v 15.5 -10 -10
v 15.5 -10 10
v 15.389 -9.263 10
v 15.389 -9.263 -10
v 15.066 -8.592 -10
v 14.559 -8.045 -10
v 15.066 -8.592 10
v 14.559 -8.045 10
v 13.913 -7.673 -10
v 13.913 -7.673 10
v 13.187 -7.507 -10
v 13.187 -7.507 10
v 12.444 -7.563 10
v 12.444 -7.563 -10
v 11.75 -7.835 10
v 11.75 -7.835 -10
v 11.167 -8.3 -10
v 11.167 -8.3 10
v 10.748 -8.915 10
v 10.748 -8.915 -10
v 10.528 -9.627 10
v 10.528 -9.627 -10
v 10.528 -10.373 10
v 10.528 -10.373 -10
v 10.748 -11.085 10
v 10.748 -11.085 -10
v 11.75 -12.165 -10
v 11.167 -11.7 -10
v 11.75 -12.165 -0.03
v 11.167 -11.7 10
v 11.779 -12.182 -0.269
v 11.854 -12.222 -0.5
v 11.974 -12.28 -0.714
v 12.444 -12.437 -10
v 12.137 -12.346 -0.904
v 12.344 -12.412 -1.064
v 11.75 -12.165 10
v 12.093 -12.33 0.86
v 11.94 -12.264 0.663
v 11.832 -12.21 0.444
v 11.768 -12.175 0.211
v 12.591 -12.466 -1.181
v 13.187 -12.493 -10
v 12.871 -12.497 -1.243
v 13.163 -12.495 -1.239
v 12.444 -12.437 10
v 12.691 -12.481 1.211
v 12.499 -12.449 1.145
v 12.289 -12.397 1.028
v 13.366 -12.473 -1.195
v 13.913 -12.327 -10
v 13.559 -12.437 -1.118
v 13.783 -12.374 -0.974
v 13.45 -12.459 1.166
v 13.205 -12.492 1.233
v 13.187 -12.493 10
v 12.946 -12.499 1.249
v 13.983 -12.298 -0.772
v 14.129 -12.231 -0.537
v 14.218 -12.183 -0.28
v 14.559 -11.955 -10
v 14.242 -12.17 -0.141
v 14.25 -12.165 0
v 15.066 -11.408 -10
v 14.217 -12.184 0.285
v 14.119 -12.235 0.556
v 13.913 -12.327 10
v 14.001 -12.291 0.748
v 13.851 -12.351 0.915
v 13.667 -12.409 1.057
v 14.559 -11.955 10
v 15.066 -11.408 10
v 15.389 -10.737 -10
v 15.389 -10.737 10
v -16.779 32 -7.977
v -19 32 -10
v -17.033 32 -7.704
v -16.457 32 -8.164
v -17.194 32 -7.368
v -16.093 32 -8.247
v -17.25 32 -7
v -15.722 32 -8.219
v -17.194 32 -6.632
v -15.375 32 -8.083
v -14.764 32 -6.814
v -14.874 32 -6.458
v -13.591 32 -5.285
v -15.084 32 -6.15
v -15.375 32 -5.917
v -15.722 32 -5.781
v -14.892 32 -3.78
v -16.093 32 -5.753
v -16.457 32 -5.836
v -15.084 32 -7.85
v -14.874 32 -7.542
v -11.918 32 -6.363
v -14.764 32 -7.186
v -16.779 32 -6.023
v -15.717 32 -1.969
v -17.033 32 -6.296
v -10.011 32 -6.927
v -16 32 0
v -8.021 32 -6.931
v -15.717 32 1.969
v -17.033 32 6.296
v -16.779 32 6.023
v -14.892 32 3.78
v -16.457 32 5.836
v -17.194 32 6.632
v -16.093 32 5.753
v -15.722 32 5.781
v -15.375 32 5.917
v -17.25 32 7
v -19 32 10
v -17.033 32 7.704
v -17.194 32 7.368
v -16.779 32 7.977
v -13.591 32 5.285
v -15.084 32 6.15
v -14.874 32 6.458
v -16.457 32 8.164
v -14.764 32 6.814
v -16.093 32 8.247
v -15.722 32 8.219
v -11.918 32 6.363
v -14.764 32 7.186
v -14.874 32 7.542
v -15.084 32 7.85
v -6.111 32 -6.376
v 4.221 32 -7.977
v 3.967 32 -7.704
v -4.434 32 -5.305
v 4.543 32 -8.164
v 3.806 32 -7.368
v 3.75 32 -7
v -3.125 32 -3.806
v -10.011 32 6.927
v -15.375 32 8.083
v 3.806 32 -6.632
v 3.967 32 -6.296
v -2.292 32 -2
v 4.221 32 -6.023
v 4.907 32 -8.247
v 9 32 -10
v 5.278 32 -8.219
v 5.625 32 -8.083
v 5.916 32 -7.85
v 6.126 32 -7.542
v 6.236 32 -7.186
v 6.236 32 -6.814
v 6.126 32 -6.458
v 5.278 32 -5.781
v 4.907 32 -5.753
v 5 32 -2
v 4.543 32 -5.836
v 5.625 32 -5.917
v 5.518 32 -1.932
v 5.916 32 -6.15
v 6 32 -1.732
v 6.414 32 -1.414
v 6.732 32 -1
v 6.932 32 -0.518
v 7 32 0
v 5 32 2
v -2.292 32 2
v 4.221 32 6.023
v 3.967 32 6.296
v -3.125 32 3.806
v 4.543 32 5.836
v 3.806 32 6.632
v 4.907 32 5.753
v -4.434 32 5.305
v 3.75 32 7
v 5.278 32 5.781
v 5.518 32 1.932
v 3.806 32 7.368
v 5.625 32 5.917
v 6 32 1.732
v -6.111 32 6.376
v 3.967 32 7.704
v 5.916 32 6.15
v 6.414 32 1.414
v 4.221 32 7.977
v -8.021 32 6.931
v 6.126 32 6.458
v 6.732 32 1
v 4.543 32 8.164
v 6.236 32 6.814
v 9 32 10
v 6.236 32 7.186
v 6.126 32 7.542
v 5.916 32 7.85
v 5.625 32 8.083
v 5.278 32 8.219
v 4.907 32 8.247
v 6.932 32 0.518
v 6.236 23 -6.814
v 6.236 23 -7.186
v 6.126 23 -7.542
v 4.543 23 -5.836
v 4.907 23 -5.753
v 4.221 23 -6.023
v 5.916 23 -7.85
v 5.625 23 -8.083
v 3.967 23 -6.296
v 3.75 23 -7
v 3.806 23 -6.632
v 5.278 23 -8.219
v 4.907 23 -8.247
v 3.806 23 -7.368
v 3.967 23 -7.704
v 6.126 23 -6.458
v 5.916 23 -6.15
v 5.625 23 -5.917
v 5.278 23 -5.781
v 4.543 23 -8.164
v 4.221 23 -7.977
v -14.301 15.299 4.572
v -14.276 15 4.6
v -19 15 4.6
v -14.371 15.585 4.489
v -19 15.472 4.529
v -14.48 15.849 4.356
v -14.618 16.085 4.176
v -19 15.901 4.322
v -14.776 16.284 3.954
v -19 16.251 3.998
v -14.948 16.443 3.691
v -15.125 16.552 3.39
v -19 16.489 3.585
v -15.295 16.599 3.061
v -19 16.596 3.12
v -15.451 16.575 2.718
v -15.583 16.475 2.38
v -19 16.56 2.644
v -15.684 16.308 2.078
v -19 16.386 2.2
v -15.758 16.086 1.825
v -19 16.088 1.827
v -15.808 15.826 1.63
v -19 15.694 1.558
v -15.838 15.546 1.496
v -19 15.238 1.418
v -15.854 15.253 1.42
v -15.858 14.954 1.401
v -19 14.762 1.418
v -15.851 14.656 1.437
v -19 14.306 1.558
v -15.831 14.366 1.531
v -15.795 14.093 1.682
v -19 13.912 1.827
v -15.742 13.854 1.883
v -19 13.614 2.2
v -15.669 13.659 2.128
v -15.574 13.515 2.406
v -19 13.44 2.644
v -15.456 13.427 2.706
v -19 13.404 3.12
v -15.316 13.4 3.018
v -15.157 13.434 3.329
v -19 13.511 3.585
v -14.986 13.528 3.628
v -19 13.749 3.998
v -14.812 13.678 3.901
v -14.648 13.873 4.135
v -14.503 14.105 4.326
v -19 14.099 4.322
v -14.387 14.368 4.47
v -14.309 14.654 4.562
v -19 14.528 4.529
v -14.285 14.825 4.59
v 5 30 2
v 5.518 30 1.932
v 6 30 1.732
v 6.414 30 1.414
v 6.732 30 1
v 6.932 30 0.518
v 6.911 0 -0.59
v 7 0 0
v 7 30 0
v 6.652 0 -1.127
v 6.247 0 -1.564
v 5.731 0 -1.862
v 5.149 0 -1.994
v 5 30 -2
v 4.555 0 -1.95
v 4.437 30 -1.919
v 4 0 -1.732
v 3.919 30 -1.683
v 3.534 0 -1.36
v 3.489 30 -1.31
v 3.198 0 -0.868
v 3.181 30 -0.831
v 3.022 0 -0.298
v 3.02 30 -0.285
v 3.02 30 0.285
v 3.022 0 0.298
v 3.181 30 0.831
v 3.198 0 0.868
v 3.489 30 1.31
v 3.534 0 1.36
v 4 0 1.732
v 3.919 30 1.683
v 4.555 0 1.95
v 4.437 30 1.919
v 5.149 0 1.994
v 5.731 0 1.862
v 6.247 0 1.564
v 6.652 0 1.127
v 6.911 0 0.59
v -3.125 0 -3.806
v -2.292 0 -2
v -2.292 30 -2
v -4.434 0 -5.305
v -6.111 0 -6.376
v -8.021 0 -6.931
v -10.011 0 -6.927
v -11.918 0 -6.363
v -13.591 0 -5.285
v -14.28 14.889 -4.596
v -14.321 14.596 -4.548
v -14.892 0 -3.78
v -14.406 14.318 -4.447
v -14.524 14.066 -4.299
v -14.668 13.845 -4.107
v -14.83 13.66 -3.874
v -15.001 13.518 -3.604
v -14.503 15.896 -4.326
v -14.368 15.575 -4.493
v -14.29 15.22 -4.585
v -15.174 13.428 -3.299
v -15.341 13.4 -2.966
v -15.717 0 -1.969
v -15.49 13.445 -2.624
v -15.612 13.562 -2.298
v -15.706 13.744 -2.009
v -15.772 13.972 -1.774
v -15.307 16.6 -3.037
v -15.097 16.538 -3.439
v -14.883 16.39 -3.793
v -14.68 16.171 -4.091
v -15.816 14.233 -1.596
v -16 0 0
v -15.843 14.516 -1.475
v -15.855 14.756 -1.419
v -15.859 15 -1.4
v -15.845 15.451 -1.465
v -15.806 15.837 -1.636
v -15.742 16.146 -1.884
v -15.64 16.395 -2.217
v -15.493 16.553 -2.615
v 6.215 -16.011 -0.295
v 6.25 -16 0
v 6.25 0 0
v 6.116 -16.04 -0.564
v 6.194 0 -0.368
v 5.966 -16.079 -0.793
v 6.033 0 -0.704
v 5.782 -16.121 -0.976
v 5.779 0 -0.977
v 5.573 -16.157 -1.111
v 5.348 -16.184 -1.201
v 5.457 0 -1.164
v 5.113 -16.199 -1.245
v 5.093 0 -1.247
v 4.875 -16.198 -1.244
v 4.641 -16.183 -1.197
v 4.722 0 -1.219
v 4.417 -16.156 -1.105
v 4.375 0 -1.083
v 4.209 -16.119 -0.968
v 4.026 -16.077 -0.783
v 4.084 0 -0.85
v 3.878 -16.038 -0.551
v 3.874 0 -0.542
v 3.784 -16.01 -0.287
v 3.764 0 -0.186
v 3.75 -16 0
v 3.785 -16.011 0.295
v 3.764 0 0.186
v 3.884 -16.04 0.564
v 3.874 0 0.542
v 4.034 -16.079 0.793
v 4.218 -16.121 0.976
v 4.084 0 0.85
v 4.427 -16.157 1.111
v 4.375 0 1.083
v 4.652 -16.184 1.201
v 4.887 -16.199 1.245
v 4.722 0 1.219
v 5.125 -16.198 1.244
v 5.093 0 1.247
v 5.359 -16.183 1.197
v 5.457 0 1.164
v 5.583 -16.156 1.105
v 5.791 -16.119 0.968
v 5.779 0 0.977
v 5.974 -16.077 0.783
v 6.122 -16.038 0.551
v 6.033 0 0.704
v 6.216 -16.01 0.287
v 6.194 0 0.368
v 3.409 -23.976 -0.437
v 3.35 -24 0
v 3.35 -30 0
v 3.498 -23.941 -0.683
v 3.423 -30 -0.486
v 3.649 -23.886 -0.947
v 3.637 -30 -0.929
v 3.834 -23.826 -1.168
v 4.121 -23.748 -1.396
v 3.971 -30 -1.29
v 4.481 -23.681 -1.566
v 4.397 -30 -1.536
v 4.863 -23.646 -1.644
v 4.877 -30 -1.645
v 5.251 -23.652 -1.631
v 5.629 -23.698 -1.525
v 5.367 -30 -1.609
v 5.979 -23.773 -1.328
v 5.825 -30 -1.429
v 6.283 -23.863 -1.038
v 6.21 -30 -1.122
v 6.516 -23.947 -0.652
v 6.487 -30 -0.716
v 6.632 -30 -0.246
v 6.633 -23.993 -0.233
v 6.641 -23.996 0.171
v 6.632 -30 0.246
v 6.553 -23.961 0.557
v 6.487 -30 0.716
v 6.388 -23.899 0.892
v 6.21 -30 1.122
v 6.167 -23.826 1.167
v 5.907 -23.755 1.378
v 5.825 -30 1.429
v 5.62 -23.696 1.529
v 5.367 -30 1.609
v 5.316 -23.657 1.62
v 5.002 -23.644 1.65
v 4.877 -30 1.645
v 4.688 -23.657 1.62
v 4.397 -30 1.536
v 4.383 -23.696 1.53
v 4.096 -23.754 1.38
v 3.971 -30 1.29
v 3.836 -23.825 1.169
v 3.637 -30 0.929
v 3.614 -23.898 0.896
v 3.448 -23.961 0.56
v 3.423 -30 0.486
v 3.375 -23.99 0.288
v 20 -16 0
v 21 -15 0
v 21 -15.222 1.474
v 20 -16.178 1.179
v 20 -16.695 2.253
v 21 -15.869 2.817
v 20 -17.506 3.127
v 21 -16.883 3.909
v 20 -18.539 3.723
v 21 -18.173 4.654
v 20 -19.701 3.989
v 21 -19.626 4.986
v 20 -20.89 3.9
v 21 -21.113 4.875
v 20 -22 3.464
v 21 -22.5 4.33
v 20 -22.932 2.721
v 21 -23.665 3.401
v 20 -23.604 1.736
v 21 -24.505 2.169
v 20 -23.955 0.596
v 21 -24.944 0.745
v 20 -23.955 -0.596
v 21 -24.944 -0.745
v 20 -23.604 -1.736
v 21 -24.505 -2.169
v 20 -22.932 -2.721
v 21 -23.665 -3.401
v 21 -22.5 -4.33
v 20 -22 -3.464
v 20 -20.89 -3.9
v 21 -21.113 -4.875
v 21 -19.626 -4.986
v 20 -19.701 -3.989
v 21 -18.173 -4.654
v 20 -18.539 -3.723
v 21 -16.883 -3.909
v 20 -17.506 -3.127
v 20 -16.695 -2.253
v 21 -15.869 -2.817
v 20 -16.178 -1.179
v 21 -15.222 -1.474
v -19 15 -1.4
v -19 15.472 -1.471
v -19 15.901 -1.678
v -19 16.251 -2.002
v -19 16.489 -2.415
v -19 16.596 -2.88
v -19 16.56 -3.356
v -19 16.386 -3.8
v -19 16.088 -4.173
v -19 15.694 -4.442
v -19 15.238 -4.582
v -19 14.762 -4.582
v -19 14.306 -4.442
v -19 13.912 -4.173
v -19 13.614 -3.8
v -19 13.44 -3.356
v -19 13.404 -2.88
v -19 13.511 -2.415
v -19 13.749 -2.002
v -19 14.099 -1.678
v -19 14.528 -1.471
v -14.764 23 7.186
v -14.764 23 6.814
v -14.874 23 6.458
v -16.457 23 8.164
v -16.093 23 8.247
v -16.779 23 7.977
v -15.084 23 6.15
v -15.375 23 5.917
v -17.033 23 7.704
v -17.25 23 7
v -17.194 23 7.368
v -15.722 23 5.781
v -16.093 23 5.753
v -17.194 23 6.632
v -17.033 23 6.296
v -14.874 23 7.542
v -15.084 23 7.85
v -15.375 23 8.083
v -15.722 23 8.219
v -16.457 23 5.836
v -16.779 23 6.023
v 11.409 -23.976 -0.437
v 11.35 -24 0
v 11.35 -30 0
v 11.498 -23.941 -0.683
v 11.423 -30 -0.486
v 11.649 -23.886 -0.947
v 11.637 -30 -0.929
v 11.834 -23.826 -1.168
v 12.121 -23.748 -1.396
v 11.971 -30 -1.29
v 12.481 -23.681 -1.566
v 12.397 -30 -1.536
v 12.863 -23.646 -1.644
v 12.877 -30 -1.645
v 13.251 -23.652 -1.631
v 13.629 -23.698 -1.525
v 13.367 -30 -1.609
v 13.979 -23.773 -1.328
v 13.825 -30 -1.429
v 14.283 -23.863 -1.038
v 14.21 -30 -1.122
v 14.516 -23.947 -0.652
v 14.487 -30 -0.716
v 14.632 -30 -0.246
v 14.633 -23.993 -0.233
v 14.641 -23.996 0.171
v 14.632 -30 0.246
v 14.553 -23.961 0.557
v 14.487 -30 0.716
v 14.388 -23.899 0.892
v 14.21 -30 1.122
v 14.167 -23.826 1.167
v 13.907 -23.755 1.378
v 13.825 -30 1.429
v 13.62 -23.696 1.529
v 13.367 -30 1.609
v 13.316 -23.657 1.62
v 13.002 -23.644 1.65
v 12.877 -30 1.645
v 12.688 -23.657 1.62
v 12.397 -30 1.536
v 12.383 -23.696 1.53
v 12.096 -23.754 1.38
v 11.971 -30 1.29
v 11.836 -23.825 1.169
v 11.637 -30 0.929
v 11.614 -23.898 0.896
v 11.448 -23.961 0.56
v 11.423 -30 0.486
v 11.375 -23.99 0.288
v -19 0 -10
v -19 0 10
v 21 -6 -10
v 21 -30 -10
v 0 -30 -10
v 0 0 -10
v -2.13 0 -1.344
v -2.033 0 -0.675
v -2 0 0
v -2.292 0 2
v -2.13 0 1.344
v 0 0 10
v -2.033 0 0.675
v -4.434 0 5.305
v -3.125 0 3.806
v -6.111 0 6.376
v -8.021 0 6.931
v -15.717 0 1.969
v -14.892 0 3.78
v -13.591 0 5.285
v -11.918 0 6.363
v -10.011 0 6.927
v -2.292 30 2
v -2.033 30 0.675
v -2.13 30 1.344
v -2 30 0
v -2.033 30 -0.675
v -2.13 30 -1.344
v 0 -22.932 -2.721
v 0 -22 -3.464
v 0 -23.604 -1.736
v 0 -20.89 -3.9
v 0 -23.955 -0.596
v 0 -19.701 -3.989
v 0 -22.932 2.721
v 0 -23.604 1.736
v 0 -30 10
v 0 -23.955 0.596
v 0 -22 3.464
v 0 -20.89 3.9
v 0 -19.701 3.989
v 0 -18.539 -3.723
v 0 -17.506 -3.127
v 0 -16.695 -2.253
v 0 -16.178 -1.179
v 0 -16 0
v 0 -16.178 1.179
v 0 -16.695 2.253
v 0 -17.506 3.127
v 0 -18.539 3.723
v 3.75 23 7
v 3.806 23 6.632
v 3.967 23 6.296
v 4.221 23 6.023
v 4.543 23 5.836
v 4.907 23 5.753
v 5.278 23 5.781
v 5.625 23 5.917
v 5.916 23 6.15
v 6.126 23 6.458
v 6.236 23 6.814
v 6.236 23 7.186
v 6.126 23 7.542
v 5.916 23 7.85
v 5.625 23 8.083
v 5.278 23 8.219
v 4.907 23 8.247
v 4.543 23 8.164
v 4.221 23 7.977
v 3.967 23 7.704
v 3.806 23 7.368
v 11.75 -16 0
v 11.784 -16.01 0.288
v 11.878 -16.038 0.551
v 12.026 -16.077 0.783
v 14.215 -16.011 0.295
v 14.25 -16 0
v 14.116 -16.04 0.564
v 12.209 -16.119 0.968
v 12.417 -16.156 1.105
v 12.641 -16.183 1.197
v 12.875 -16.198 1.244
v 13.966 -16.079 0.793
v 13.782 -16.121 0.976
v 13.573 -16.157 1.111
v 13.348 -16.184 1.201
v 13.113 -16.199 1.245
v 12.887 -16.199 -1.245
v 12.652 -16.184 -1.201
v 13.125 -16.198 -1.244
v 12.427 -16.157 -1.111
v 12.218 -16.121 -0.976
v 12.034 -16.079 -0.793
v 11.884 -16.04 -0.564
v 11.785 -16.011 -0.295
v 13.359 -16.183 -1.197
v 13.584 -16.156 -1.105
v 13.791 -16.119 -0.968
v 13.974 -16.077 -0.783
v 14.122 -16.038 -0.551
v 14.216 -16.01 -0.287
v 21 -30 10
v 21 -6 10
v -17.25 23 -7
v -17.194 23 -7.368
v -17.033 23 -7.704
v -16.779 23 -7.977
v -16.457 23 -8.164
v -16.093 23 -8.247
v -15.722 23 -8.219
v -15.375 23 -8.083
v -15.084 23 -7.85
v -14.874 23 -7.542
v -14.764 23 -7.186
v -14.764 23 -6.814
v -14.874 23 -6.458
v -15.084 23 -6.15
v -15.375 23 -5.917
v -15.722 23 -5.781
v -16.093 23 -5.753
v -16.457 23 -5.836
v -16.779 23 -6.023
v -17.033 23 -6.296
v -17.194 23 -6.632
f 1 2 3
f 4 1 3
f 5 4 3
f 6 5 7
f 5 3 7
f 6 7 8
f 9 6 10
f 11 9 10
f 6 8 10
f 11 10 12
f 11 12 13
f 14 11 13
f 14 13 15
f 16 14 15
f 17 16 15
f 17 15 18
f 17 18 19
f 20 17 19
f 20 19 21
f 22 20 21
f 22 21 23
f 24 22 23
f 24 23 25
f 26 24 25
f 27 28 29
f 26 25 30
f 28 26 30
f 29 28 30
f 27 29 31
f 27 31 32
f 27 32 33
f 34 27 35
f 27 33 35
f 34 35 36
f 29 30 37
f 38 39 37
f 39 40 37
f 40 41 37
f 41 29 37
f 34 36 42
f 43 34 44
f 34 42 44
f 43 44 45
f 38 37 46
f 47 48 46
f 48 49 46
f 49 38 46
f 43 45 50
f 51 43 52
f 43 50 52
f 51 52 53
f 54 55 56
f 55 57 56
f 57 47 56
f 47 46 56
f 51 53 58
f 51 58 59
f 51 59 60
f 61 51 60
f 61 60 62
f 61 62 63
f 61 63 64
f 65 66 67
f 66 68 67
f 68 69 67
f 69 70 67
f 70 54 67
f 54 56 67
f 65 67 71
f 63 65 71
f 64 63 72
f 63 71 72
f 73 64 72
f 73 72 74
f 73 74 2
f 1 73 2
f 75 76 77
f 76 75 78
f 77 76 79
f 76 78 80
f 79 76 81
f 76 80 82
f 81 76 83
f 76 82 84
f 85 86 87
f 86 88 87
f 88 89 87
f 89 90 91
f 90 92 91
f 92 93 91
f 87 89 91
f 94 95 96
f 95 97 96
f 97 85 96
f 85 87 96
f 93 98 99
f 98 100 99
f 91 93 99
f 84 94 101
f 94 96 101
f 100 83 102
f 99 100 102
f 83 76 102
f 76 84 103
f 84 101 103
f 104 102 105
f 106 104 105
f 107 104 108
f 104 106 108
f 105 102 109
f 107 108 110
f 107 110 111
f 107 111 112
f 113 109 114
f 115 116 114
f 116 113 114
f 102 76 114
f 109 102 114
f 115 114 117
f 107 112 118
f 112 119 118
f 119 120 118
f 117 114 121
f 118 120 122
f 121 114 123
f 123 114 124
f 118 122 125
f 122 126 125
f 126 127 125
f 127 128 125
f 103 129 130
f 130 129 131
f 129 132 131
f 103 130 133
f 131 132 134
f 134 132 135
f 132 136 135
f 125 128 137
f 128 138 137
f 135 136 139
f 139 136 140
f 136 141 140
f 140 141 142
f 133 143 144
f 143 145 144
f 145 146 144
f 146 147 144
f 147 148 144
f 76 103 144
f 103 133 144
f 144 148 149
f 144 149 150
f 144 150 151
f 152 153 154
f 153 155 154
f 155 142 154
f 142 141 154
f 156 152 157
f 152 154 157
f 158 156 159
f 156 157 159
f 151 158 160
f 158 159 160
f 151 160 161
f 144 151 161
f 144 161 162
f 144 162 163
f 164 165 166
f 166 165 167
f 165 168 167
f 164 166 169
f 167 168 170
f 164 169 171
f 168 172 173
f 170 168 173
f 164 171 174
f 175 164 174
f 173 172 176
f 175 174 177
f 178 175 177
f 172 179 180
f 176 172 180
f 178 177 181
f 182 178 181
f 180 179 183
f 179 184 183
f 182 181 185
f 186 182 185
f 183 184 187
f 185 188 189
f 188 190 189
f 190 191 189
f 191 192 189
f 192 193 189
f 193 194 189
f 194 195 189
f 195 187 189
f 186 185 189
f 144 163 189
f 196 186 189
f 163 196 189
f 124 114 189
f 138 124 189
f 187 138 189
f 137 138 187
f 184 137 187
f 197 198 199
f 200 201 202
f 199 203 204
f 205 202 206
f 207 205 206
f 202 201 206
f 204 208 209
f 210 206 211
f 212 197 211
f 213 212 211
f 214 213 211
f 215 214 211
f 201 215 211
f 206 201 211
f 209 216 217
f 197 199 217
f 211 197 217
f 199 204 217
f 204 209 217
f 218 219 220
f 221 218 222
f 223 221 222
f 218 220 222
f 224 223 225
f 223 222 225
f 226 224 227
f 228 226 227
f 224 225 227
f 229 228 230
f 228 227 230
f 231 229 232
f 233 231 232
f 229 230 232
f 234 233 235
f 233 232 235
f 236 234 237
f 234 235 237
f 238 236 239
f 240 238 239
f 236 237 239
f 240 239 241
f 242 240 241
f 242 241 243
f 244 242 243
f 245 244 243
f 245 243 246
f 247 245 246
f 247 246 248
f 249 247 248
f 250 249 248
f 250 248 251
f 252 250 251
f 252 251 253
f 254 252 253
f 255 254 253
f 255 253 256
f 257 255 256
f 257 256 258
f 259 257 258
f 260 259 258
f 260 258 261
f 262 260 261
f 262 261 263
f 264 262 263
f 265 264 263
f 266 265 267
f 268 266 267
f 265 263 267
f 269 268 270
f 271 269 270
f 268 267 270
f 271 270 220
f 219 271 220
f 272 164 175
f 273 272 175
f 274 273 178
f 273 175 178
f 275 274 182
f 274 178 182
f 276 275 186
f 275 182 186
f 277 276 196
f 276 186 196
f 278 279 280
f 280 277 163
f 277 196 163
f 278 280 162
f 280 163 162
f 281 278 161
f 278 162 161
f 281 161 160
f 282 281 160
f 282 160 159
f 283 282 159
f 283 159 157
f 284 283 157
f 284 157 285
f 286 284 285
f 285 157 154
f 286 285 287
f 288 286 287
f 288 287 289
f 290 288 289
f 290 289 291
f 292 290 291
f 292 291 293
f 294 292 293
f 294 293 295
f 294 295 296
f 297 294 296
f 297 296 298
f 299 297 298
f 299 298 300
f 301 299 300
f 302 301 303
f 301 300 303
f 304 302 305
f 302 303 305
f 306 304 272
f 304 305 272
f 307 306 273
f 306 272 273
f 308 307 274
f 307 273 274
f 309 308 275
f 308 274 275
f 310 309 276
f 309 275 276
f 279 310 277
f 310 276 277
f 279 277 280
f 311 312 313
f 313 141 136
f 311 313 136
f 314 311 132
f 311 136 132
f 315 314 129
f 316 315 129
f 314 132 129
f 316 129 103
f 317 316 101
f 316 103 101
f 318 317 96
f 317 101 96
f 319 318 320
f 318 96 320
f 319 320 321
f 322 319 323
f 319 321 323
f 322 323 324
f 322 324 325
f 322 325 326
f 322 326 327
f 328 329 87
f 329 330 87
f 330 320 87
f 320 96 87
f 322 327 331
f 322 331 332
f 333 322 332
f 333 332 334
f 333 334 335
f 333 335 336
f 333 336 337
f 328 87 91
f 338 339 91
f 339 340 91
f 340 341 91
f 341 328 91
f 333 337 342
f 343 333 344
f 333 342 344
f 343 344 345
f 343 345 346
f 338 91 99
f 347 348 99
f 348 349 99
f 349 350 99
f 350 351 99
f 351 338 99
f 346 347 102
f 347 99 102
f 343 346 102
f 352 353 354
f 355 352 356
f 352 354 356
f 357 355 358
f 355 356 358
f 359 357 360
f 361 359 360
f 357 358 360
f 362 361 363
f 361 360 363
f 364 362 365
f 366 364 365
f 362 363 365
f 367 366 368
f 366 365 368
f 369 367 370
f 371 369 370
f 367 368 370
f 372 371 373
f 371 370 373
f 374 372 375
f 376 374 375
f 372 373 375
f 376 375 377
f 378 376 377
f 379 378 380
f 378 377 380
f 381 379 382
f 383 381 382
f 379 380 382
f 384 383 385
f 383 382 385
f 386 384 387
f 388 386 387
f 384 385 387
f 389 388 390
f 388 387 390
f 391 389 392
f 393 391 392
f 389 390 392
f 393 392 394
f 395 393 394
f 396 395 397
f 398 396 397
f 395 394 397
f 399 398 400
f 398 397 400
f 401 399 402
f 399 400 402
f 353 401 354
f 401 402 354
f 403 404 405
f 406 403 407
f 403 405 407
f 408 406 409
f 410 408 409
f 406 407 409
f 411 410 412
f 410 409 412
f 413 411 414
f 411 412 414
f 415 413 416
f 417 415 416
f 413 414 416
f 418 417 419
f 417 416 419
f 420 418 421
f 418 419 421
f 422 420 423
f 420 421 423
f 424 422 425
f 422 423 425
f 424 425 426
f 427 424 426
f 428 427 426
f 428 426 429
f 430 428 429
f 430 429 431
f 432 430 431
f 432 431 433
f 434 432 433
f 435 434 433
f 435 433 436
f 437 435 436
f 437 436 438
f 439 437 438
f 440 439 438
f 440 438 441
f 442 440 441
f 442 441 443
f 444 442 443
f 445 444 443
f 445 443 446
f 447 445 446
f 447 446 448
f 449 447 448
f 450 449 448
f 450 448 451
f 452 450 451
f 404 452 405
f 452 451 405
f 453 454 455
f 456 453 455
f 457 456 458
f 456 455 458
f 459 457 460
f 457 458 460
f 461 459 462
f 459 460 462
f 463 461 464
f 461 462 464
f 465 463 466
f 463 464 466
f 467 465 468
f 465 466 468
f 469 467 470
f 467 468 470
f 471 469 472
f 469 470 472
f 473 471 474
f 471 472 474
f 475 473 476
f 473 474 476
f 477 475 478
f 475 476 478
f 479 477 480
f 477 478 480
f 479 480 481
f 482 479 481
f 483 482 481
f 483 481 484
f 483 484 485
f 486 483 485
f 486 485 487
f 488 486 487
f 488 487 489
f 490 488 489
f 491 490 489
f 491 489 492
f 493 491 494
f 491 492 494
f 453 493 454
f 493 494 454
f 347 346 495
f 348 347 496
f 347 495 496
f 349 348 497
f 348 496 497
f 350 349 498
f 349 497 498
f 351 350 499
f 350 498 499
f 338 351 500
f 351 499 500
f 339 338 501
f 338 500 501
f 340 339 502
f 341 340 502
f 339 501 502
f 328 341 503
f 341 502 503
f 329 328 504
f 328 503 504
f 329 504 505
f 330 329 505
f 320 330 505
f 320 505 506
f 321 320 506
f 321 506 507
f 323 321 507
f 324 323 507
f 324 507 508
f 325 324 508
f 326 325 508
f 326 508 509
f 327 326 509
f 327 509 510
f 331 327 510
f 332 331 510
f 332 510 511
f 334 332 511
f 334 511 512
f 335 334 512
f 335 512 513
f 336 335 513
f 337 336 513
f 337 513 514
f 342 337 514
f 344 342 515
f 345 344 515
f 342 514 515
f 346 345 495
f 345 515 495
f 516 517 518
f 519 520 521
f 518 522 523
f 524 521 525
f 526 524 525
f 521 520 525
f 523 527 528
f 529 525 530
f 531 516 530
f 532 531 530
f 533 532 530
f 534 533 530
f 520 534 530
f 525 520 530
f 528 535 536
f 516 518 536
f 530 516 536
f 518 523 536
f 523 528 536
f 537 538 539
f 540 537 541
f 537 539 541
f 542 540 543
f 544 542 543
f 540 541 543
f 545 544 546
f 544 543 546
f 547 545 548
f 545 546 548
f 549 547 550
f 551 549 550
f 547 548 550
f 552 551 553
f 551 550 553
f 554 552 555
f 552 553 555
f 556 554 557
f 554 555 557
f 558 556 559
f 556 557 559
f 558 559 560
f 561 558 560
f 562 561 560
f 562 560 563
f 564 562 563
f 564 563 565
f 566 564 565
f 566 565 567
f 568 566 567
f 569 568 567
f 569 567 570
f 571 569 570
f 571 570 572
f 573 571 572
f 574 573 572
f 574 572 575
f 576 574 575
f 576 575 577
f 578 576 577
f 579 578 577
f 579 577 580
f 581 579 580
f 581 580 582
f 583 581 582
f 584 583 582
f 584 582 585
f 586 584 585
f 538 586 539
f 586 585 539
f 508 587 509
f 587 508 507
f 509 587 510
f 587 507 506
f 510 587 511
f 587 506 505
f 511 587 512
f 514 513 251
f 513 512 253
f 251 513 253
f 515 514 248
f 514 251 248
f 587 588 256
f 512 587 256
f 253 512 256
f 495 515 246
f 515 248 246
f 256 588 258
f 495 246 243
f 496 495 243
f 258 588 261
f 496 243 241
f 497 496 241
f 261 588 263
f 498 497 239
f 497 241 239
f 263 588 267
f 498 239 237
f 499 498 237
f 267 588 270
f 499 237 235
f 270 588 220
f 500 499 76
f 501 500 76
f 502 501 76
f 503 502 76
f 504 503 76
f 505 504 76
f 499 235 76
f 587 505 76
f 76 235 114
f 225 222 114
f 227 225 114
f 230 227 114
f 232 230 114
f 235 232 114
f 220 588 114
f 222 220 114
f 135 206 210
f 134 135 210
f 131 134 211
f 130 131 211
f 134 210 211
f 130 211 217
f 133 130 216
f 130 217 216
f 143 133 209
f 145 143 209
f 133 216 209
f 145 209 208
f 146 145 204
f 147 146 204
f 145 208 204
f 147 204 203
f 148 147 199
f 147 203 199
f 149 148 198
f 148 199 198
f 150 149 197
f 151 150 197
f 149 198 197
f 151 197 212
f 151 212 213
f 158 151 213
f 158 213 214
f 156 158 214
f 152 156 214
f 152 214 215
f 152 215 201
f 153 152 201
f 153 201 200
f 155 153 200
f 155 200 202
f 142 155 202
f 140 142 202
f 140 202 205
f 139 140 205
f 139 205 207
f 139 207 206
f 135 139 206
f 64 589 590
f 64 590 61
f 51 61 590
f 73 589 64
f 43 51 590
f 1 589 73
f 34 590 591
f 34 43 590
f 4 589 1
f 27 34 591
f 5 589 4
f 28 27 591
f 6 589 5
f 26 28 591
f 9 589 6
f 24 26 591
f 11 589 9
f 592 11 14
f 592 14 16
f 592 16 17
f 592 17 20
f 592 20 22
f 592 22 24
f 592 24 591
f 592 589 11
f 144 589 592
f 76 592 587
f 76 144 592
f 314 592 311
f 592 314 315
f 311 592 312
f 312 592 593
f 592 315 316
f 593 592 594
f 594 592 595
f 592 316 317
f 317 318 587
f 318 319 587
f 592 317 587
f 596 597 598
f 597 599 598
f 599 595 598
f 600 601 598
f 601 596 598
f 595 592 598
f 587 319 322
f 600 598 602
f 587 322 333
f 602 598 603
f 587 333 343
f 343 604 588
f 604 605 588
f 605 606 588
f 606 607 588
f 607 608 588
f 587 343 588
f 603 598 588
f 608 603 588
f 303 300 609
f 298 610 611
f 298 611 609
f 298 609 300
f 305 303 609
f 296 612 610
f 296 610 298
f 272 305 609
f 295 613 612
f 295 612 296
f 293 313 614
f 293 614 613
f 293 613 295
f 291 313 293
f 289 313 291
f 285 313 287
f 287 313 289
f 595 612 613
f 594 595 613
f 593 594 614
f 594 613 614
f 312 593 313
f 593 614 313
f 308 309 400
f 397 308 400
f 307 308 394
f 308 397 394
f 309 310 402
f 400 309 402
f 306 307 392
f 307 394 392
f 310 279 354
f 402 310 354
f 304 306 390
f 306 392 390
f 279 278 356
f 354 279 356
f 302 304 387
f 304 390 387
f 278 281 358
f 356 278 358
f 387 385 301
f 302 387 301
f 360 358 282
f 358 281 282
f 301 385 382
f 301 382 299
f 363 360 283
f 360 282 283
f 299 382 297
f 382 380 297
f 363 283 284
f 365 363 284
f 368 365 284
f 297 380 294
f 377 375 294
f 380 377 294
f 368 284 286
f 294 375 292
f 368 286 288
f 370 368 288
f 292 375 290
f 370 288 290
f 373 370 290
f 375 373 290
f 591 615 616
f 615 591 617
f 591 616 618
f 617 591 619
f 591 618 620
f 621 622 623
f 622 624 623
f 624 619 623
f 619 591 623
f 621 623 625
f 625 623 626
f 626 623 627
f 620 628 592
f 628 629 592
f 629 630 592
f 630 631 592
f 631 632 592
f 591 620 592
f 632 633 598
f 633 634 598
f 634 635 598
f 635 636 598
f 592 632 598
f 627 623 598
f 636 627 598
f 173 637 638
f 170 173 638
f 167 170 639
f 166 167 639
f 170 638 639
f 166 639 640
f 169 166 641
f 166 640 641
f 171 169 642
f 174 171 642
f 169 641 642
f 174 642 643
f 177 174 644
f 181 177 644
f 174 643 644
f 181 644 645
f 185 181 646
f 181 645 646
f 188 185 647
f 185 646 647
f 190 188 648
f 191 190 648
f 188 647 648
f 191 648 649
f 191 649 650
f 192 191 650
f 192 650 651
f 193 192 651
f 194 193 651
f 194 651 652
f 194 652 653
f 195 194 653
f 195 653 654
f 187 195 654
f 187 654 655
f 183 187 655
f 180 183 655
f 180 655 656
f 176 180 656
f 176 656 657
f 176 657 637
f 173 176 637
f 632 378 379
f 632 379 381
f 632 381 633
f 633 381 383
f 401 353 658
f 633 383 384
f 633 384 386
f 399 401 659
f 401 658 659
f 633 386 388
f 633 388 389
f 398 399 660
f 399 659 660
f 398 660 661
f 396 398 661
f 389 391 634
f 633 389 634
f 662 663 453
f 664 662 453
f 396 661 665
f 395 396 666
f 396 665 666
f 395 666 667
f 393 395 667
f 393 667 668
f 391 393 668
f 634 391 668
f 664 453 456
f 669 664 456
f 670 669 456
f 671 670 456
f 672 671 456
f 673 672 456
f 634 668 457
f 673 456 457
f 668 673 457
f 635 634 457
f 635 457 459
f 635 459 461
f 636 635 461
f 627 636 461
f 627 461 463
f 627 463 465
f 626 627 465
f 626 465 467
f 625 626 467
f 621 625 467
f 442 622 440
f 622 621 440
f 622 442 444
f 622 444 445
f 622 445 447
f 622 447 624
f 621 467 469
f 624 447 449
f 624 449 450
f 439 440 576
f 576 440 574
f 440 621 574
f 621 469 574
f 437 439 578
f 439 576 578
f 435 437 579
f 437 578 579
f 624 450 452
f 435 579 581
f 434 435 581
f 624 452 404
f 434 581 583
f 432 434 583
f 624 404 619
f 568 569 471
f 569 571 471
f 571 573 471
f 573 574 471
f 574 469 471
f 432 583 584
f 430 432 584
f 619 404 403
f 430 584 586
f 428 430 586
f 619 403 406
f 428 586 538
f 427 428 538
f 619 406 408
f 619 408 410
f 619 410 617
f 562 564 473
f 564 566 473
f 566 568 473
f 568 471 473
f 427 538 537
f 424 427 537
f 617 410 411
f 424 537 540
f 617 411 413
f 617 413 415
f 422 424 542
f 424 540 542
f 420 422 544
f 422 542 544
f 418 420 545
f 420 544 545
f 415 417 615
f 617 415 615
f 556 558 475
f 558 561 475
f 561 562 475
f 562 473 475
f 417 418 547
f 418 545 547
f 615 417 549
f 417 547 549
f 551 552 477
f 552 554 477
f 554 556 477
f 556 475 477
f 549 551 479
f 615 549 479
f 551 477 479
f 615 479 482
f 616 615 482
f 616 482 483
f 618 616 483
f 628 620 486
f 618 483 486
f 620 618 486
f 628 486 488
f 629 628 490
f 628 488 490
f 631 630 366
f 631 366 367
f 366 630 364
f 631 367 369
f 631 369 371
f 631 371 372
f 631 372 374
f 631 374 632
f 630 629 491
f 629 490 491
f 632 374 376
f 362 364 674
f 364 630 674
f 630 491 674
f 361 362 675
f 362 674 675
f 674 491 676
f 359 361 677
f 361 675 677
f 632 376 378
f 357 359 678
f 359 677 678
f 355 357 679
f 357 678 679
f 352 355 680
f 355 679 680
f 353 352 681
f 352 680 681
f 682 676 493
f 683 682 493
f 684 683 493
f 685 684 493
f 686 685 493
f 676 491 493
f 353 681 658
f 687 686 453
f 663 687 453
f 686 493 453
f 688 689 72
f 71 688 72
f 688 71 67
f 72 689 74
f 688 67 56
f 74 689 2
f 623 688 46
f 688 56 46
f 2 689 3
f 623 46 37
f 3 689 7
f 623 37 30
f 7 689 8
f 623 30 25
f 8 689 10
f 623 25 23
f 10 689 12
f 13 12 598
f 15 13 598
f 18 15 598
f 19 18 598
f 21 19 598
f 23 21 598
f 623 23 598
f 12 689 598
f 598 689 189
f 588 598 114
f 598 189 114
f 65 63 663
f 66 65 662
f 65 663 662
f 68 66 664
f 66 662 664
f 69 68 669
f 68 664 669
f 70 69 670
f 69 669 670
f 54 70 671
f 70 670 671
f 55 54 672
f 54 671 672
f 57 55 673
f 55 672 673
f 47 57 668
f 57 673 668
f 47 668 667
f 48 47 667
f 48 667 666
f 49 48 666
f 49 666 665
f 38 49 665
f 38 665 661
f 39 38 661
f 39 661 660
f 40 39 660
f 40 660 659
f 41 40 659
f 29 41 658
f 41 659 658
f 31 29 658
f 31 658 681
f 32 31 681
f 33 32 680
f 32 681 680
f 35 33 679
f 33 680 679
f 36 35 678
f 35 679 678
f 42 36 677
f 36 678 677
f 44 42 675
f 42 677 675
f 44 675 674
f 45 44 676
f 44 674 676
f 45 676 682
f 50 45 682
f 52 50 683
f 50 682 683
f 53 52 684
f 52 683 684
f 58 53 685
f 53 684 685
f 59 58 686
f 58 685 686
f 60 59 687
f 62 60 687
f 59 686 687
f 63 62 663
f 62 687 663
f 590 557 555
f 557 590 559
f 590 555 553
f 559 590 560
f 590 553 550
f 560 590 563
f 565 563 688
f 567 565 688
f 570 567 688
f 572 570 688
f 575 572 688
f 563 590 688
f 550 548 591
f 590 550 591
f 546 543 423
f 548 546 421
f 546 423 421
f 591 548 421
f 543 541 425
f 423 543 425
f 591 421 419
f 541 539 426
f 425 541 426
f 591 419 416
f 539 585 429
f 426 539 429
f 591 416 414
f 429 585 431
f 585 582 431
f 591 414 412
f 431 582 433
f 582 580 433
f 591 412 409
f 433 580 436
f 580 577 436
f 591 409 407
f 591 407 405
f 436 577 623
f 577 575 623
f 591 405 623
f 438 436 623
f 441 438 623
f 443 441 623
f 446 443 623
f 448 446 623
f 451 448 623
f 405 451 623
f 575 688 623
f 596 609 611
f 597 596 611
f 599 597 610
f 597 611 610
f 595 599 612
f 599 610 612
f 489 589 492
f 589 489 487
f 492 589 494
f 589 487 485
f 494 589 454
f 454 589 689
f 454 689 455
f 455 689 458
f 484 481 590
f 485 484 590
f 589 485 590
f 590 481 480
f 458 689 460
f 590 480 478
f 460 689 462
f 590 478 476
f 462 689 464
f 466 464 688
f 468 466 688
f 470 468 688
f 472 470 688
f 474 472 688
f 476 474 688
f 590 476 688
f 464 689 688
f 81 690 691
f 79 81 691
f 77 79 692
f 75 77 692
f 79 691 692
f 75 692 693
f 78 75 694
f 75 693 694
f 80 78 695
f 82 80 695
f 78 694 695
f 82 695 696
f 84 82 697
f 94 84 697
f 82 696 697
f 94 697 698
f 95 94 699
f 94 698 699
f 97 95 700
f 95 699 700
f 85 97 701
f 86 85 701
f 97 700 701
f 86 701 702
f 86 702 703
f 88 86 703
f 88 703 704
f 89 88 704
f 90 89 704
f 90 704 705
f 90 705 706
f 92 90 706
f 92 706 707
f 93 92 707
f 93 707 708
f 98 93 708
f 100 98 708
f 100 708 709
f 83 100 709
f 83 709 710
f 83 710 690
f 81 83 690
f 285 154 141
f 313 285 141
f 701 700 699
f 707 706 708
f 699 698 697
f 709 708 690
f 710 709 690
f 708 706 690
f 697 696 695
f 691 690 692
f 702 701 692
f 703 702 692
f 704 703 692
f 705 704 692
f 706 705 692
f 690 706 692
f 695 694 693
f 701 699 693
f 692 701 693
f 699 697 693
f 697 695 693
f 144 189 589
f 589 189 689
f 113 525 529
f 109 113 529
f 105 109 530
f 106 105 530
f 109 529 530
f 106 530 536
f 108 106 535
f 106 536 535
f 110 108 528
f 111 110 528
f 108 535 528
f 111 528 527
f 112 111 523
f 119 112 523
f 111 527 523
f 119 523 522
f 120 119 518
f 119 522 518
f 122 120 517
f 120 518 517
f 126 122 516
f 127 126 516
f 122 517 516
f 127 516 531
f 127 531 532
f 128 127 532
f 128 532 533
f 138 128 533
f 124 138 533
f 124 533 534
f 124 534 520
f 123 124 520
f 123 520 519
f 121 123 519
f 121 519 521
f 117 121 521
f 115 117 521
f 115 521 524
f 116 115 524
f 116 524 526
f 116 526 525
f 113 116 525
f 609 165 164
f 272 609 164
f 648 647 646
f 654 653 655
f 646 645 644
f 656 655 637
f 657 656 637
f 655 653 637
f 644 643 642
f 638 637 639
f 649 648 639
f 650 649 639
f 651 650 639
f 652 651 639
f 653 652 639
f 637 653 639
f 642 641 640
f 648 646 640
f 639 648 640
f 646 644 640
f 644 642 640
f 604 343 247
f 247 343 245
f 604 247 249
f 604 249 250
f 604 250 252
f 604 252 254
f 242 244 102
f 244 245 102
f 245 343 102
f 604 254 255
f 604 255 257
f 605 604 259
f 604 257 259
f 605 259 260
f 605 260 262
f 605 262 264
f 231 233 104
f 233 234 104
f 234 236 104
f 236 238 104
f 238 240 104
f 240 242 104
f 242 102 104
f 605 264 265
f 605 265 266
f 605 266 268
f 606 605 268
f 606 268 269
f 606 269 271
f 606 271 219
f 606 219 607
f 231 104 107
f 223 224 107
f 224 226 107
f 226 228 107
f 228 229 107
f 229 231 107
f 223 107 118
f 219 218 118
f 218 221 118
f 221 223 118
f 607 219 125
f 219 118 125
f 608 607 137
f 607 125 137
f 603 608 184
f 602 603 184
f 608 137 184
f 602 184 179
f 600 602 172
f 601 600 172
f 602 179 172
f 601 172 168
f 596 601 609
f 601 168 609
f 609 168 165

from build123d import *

# Parameters (mm, degrees)
BOSS_EXTRUDE2_DEPTH     = 10
CUT_EXTRUDE1_DEPTH      = 67.219332525
CUT_EXTRUDE2_DEPTH      = 2
M3_TAPPED_HOLE1_D       = 2.5
M3_TAPPED_HOLE1_DEPTH   = 9
SKETCH9_R               = 2.5
CUT_EXTRUDE3_DEPTH      = 44.185645763
SKETCH10_R              = 4
CUT_EXTRUDE4_DEPTH      = 53.191953403
CHAMFER1_SIZE           = 1
CUT_EXTRUDE5_REACH      = 54.192
CUT_EXTRUDE5_END_RADIUS = 7
SKETCH13_R              = 1.6
M4_TAPPED_HOLE1_REACH   = 68.219
M4_TAPPED_HOLE1_BORE_R  = 1.65
CUT_EXTRUDE6_REACH      = 68.219
CUT_EXTRUDE6_END_RADIUS = 2.5
SKETCH19_R              = 1.25


# Read off the part's stored shape, not the designer's step: Hole1
with BuildPart() as part:
    # Sketch4 → Boss-Extrude2 (new, symmetric)
    with BuildSketch(Plane.XY):
        Polygon((0, 0), (-19, 0), (-19, 32), (9, 32), (21, -6), (21, -30), (0, -30), align=None)
    extrude(amount=BOSS_EXTRUDE2_DEPTH, both=True)

    # Sketch6 → Cut-Extrude1 (cut, through all)
    with BuildSketch(Plane(origin=(0, 32, 0), x_dir=(1, 0, 0), z_dir=(0, 1, 0))):
        with BuildLine():
            ThreePointArc((-2.291796068, 2), (-10.010587075, 6.926666858), (-16, 0))
            Line((-16, 0), (-2, 0))
            ThreePointArc((-2, 0), (-2.073333142, 1.010587075), (-2.291796068, 2))
        make_face()
        with BuildLine():
            Line((-2, 0), (-16, 0))
            ThreePointArc((-16, 0), (-10.010587075, -6.926666858), (-2.291796068, -2))
            ThreePointArc((-2.291796068, -2), (-2.073333142, -1.010587075), (-2, 0))
        make_face()
    extrude(amount=-CUT_EXTRUDE1_DEPTH, mode=Mode.SUBTRACT)

    # Sketch6<3> → Cut-Extrude2 (cut)
    with BuildSketch(Plane(origin=(0, 32, 0), x_dir=(1, 0, 0), z_dir=(0, 1, 0))):
        with BuildLine():
            ThreePointArc((5, 2), (3.585786438, 1.414213562), (3, 0))
            Line((3, 0), (7, 0))
            ThreePointArc((7, 0), (6.414213562, 1.414213562), (5, 2))
        make_face()
        with BuildLine():
            Line((7, 0), (3, 0))
            ThreePointArc((3, 0), (3.585786438, -1.414213562), (5, -2))
            ThreePointArc((5, -2), (6.414213562, -1.414213562), (7, 0))
        make_face()
        with BuildLine():
            ThreePointArc((-2.291796068, 2), (-2.073333142, 1.010587075), (-2, 0))
            Line((-2, 0), (3, 0))
            ThreePointArc((3, 0), (3.585786438, 1.414213562), (5, 2))
            Line((5, 2), (-2.291796068, 2))
        make_face()
        with BuildLine():
            Line((3, 0), (-2, 0))
            ThreePointArc((-2, 0), (-2.073333142, -1.010587075), (-2.291796068, -2))
            Line((-2.291796068, -2), (5, -2))
            ThreePointArc((5, -2), (3.585786438, -1.414213562), (3, 0))
        make_face()
    extrude(amount=-CUT_EXTRUDE2_DEPTH, mode=Mode.SUBTRACT)

    # M3 Tapped Hole1
    with Locations(Plane(origin=(0, 32, 0), x_dir=(1, 0, 0), z_dir=(0, 1, 0))):
        with Locations((-16, 7), (-16, -7), (5, -7), (5, 7)):
            Hole(M3_TAPPED_HOLE1_D / 2, depth=M3_TAPPED_HOLE1_DEPTH)

    # Sketch9 → Cut-Extrude3 (cut, through all)
    with BuildSketch(Plane.XY.offset(10)):
        with Locations((13, -10)):
            Circle(SKETCH9_R)
    extrude(amount=-CUT_EXTRUDE3_DEPTH, mode=Mode.SUBTRACT)

    # Sketch10 → Cut-Extrude4 (cut, through all)
    with BuildSketch(Plane(origin=(21, 0, 0), x_dir=(0, 0, -1), z_dir=(1, 0, 0))):
        with Locations(Location((0, -20, 0), (0, 0, 90))):
            Circle(SKETCH10_R)
    extrude(amount=-CUT_EXTRUDE4_DEPTH, mode=Mode.SUBTRACT)

    # Chamfer1
    chamfer1_edges = [part.edges().sort_by_distance(p)[0] for p in [
        (21, -24, 0),
    ]]
    chamfer(chamfer1_edges, length=CHAMFER1_SIZE)

    # Hole1 outline → Hole1 (revolve, cut)
    with BuildSketch(Plane(origin=(5, 0, 0), x_dir=(1, 0, 0), z_dir=(0, 0, 1))):
        Polygon((1.25, 0), (2, 0), (2, 32), (0, 32), (0, -16.200355886), (1.25, -16.200355886), align=None)
    revolve(axis=Axis((5, 0, 0), (0, 1, 0)), mode=Mode.SUBTRACT)

    # Cut-Extrude5: up to this cylinder (the profile starts outside it)
    cut_extrude5_end = Plane(origin=(-9, 15, 0), z_dir=(0, 1, 0)) * Cylinder(CUT_EXTRUDE5_END_RADIUS, 123.384, mode=Mode.PRIVATE)
    # Sketch13 → Cut-Extrude5 (cut, up to the surface)
    with BuildSketch(Plane.ZY.offset(19), mode=Mode.PRIVATE) as cut_extrude5_sk1:
        with Locations((-3, 15)):
            Circle(SKETCH13_R)
    cut_extrude5_tool1 = extrude(cut_extrude5_sk1.sketch, amount=-CUT_EXTRUDE5_REACH, mode=Mode.PRIVATE) - cut_extrude5_end
    add(cut_extrude5_tool1.solids().sort_by_distance((-19, 15, -3))[0], mode=Mode.SUBTRACT)
    # Sketch13 → Cut-Extrude5 (cut, up to the surface)
    with BuildSketch(Plane.ZY.offset(19), mode=Mode.PRIVATE) as cut_extrude5_sk2:
        with Locations((3, 15)):
            Circle(SKETCH13_R)
    cut_extrude5_tool2 = extrude(cut_extrude5_sk2.sketch, amount=-CUT_EXTRUDE5_REACH, mode=Mode.PRIVATE) - cut_extrude5_end
    add(cut_extrude5_tool2.solids().sort_by_distance((-19, 15, 3))[0], mode=Mode.SUBTRACT)

    # M4 Tapped Hole1 bore → M4 Tapped Hole1 (cut, up to next)
    with BuildSketch(Plane(origin=(0, -30, 0), x_dir=(-1, 0, 0), z_dir=(0, -1, 0)), mode=Mode.PRIVATE) as m4_tapped_hole1_sk1:
        with Locations((-13, 0)):
            Circle(M4_TAPPED_HOLE1_BORE_R)
    m4_tapped_hole1_tool1 = extrude(m4_tapped_hole1_sk1.sketch, amount=-M4_TAPPED_HOLE1_REACH, mode=Mode.PRIVATE) & part.part
    # M4 Tapped Hole1 bore → M4 Tapped Hole1 (cut, up to next)
    with BuildSketch(Plane(origin=(0, -30, 0), x_dir=(-1, 0, 0), z_dir=(0, -1, 0)), mode=Mode.PRIVATE) as m4_tapped_hole1_sk2:
        with Locations((-5, 0)):
            Circle(M4_TAPPED_HOLE1_BORE_R)
    m4_tapped_hole1_tool2 = extrude(m4_tapped_hole1_sk2.sketch, amount=-M4_TAPPED_HOLE1_REACH, mode=Mode.PRIVATE) & part.part
    add(m4_tapped_hole1_tool1.solids().sort_by_distance((13, -30, 0))[0], mode=Mode.SUBTRACT)
    add(m4_tapped_hole1_tool2.solids().sort_by_distance((5, -30, 0))[0], mode=Mode.SUBTRACT)

    # Cut-Extrude6: up to this cylinder (the profile starts outside it)
    cut_extrude6_end = Plane(origin=(13, -10, 0), z_dir=(0, 0, 1)) * Cylinder(CUT_EXTRUDE6_END_RADIUS, 142.438, mode=Mode.PRIVATE)
    # Sketch19 → Cut-Extrude6 (cut, up to the surface)
    with BuildSketch(Plane.XZ.offset(30), mode=Mode.PRIVATE) as cut_extrude6_sk1:
        with Locations((13, 0)):
            Circle(SKETCH19_R)
    cut_extrude6_tool1 = extrude(cut_extrude6_sk1.sketch, amount=-CUT_EXTRUDE6_REACH, mode=Mode.PRIVATE) - cut_extrude6_end
    add(cut_extrude6_tool1.solids().sort_by_distance((13, -30, 0))[0], mode=Mode.SUBTRACT)


solid = part.part
